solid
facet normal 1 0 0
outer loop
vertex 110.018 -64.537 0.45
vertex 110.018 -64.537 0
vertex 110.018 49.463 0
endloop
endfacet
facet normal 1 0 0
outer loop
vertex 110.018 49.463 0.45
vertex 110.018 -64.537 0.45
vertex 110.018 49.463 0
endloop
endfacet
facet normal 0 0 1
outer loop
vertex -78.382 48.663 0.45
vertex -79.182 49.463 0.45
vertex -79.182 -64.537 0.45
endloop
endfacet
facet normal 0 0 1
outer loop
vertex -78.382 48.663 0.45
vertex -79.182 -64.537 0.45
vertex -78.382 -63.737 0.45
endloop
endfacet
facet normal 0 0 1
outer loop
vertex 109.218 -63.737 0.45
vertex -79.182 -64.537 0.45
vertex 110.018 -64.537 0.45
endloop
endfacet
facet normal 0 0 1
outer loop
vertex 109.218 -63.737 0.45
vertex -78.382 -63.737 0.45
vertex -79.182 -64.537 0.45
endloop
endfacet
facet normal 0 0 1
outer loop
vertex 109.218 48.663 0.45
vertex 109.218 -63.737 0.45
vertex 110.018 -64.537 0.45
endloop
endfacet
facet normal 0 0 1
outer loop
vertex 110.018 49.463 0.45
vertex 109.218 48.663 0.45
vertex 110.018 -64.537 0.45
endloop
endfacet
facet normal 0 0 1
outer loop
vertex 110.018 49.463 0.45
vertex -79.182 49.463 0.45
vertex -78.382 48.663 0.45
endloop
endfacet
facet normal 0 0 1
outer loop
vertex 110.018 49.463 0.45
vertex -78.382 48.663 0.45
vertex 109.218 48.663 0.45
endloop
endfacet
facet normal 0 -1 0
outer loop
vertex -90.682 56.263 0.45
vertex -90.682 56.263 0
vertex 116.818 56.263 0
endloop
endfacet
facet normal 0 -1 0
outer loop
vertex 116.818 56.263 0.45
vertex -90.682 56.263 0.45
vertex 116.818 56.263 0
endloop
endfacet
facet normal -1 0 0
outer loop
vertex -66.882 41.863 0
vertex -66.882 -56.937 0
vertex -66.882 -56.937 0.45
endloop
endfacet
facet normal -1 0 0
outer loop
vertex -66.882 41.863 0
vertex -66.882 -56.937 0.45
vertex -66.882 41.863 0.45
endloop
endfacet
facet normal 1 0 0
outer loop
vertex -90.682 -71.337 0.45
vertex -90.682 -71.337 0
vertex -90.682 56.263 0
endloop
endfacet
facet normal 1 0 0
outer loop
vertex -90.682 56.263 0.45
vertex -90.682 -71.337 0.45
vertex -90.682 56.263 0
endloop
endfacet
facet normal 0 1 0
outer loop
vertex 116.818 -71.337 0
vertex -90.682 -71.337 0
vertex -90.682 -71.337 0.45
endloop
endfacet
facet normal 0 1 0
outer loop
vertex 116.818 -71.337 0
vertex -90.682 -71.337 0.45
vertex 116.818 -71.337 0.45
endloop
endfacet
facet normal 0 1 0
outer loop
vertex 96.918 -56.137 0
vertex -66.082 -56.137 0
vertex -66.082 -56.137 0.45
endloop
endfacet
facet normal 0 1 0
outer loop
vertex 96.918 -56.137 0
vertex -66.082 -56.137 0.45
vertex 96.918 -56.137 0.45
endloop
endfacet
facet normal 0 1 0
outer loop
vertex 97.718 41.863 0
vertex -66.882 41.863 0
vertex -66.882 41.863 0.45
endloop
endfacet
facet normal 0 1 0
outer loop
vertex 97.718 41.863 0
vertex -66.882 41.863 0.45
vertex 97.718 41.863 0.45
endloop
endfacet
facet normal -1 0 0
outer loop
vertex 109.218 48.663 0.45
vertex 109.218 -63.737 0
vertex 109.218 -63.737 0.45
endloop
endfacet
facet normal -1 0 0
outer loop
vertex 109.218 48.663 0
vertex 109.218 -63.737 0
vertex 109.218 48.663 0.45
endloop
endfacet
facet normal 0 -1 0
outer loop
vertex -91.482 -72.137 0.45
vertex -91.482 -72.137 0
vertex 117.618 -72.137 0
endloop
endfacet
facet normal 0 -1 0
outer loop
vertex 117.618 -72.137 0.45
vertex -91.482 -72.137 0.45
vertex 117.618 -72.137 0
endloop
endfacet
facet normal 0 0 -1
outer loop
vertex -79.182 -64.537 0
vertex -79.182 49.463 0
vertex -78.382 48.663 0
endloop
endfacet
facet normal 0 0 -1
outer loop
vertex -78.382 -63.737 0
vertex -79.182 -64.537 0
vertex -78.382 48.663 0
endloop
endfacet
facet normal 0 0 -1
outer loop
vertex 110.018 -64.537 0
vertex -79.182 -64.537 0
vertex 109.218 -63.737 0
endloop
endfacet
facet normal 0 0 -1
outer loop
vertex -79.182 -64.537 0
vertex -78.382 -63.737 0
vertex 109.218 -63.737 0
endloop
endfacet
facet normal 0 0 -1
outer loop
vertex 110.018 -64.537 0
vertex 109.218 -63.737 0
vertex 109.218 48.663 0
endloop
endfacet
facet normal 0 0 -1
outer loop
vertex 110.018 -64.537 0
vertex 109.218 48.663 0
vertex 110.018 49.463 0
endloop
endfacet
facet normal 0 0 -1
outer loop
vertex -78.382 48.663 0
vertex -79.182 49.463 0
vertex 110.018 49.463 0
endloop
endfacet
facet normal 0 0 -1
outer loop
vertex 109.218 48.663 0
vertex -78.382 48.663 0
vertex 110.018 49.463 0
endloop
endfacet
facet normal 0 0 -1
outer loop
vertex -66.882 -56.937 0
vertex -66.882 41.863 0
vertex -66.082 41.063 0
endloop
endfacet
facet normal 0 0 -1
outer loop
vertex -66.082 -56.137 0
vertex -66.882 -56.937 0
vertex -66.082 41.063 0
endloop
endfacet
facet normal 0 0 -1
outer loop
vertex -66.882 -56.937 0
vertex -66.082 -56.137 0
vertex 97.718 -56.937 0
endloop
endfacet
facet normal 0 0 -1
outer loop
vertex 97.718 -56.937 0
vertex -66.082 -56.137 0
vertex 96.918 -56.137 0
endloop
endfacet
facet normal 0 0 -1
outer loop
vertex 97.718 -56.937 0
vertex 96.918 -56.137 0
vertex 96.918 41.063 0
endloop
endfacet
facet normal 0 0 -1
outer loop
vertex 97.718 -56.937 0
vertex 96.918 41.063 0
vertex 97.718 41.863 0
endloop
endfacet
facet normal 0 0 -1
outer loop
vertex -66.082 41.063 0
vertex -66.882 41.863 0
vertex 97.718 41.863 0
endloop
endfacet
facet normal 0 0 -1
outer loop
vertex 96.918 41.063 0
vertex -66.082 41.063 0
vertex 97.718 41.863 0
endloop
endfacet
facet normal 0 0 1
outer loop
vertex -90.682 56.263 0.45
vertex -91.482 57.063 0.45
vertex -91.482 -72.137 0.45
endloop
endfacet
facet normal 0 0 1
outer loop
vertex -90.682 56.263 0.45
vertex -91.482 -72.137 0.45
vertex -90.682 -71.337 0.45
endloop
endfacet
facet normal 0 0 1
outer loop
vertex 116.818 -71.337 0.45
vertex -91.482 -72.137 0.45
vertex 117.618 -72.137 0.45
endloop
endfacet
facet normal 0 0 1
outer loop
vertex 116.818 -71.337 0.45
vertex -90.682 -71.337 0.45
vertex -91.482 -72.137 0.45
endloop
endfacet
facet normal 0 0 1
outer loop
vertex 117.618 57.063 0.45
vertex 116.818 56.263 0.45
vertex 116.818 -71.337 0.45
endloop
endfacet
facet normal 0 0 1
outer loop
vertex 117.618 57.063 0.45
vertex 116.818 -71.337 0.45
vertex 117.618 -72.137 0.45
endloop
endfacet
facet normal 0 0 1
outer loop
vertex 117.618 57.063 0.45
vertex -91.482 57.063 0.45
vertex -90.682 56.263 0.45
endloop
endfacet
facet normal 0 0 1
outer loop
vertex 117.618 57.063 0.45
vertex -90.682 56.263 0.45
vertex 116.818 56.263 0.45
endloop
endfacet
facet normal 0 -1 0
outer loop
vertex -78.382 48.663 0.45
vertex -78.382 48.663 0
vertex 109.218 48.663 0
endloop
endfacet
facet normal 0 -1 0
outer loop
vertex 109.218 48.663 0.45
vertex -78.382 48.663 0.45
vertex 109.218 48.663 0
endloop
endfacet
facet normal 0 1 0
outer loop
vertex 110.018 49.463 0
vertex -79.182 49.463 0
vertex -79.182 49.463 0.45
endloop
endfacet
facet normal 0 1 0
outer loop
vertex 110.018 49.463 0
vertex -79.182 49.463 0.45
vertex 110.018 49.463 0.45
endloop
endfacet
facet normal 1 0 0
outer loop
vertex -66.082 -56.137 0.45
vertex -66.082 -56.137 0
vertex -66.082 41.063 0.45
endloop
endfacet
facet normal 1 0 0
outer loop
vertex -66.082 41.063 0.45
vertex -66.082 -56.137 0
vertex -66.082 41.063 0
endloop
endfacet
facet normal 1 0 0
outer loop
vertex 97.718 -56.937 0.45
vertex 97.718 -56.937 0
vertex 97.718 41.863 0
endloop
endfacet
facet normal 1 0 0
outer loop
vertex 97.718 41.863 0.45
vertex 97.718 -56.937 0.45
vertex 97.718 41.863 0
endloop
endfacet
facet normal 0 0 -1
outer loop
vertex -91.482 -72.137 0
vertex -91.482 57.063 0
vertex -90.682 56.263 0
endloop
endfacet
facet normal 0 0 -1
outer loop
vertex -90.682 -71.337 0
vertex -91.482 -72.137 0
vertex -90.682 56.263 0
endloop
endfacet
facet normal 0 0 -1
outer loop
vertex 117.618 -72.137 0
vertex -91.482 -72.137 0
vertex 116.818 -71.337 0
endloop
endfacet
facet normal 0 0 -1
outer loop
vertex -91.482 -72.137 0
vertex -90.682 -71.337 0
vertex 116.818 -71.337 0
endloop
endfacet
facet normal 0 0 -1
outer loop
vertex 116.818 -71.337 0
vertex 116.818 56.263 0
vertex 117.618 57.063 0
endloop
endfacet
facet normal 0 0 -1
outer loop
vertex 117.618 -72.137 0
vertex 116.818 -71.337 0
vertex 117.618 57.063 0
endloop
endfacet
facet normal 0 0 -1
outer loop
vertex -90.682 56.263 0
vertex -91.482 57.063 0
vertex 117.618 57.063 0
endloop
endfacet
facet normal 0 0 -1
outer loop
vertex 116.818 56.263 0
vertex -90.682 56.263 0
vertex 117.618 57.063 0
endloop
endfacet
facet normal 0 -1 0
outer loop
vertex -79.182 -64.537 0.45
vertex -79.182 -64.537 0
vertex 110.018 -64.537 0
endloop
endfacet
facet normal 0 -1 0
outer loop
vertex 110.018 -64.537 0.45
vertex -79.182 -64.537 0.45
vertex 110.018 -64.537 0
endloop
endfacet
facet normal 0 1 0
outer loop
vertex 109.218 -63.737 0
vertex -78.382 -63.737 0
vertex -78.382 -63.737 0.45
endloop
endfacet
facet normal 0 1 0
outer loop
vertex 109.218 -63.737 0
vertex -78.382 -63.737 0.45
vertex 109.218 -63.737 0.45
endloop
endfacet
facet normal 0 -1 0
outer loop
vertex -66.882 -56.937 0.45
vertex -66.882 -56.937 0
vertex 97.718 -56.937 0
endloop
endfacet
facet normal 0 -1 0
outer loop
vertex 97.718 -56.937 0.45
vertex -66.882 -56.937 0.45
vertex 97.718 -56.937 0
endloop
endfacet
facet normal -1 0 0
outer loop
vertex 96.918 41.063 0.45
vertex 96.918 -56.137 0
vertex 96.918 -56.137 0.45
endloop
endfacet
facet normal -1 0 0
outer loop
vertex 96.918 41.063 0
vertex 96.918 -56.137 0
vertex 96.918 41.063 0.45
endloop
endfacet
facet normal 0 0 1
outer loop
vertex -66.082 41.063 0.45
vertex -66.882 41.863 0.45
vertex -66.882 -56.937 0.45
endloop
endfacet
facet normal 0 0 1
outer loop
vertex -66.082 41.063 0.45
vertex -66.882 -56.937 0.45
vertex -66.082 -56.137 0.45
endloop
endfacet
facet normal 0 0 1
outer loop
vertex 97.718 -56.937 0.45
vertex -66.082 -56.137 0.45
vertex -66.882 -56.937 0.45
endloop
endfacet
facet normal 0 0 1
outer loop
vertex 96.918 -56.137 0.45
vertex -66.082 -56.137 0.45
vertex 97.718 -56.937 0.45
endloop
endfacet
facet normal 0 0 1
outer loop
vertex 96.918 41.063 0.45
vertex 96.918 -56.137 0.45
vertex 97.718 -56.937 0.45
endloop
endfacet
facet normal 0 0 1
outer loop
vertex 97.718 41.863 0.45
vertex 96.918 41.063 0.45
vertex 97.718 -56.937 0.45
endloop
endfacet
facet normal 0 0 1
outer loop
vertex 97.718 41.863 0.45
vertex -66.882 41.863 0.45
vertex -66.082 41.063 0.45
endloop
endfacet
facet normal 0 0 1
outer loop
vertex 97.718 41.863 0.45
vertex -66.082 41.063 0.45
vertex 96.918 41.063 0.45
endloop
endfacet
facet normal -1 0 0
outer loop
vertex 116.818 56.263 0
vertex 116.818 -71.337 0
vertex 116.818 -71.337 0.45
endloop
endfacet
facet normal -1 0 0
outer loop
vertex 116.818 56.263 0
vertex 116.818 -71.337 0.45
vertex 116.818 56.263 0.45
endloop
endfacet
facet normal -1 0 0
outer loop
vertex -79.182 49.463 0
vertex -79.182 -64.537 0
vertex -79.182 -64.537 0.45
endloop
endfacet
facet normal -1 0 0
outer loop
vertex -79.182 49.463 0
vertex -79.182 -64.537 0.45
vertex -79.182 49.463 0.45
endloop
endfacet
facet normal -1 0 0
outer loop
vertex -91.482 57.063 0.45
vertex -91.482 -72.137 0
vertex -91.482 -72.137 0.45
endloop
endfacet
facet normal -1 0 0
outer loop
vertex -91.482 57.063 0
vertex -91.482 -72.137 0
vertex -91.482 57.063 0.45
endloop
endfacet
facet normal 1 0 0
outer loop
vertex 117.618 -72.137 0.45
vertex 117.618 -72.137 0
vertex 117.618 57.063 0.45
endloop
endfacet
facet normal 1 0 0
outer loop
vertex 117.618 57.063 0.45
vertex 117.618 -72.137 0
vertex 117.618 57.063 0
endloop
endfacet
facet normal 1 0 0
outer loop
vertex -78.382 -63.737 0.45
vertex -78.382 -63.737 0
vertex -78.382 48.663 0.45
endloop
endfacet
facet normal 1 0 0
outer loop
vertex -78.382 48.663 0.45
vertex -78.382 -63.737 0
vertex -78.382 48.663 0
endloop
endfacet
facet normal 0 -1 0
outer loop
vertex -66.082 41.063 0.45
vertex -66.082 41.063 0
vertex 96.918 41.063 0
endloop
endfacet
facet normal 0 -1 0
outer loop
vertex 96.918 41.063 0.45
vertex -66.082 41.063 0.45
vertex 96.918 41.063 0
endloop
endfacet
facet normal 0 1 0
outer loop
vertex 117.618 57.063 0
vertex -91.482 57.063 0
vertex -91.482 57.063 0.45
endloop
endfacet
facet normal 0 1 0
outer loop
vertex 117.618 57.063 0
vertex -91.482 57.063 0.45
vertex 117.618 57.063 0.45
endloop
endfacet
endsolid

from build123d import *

# Parameters (mm, degrees)
F1_W     = 189.2
F1_H     = 114
F1_W_2   = 187.6
F1_H_2   = 112.4
F2_DEPTH = 0.45
F1_W_3   = 209.1
F1_H_3   = 129.2
F1_W_4   = 207.5
F1_H_4   = 127.6
F1_W_5   = 164.6
F1_H_5   = 98.8
F1_W_6   = 163
F1_H_6   = 97.2


# Not quite as in the source:
# - a feature names something its author has since deleted; it is built from what else it names


with BuildPart() as f2:
    # F1 (on Top) → F2 (new body)
    with BuildSketch(Plane.XY):
        with Locations((15.4175617039, -7.5367691362)):
            Rectangle(F1_W, F1_H)
        with Locations((15.4175617039, -7.5367691362)):
            Rectangle(F1_W_2, F1_H_2, mode=Mode.SUBTRACT)
    extrude(amount=F2_DEPTH)


with BuildPart() as f2b:
    # F1 (on Top) → F2, piece 2 (new body)
    with BuildSketch(Plane.XY):
        with Locations((13.0675617039, -7.5367691362)):
            Rectangle(F1_W_3, F1_H_3)
        with Locations((13.0675617039, -7.5367691362)):
            Rectangle(F1_W_4, F1_H_4, mode=Mode.SUBTRACT)
    extrude(amount=F2_DEPTH)


with BuildPart() as f2c:
    # F1 (on Top) → F2, piece 3 (new body)
    with BuildSketch(Plane.XY):
        with Locations((15.4175617039, -7.5367691362)):
            Rectangle(F1_W_5, F1_H_5)
        with Locations((15.4175617039, -7.5367691362)):
            Rectangle(F1_W_6, F1_H_6, mode=Mode.SUBTRACT)
    extrude(amount=F2_DEPTH)


solid = Compound([f2.part, f2b.part, f2c.part])
